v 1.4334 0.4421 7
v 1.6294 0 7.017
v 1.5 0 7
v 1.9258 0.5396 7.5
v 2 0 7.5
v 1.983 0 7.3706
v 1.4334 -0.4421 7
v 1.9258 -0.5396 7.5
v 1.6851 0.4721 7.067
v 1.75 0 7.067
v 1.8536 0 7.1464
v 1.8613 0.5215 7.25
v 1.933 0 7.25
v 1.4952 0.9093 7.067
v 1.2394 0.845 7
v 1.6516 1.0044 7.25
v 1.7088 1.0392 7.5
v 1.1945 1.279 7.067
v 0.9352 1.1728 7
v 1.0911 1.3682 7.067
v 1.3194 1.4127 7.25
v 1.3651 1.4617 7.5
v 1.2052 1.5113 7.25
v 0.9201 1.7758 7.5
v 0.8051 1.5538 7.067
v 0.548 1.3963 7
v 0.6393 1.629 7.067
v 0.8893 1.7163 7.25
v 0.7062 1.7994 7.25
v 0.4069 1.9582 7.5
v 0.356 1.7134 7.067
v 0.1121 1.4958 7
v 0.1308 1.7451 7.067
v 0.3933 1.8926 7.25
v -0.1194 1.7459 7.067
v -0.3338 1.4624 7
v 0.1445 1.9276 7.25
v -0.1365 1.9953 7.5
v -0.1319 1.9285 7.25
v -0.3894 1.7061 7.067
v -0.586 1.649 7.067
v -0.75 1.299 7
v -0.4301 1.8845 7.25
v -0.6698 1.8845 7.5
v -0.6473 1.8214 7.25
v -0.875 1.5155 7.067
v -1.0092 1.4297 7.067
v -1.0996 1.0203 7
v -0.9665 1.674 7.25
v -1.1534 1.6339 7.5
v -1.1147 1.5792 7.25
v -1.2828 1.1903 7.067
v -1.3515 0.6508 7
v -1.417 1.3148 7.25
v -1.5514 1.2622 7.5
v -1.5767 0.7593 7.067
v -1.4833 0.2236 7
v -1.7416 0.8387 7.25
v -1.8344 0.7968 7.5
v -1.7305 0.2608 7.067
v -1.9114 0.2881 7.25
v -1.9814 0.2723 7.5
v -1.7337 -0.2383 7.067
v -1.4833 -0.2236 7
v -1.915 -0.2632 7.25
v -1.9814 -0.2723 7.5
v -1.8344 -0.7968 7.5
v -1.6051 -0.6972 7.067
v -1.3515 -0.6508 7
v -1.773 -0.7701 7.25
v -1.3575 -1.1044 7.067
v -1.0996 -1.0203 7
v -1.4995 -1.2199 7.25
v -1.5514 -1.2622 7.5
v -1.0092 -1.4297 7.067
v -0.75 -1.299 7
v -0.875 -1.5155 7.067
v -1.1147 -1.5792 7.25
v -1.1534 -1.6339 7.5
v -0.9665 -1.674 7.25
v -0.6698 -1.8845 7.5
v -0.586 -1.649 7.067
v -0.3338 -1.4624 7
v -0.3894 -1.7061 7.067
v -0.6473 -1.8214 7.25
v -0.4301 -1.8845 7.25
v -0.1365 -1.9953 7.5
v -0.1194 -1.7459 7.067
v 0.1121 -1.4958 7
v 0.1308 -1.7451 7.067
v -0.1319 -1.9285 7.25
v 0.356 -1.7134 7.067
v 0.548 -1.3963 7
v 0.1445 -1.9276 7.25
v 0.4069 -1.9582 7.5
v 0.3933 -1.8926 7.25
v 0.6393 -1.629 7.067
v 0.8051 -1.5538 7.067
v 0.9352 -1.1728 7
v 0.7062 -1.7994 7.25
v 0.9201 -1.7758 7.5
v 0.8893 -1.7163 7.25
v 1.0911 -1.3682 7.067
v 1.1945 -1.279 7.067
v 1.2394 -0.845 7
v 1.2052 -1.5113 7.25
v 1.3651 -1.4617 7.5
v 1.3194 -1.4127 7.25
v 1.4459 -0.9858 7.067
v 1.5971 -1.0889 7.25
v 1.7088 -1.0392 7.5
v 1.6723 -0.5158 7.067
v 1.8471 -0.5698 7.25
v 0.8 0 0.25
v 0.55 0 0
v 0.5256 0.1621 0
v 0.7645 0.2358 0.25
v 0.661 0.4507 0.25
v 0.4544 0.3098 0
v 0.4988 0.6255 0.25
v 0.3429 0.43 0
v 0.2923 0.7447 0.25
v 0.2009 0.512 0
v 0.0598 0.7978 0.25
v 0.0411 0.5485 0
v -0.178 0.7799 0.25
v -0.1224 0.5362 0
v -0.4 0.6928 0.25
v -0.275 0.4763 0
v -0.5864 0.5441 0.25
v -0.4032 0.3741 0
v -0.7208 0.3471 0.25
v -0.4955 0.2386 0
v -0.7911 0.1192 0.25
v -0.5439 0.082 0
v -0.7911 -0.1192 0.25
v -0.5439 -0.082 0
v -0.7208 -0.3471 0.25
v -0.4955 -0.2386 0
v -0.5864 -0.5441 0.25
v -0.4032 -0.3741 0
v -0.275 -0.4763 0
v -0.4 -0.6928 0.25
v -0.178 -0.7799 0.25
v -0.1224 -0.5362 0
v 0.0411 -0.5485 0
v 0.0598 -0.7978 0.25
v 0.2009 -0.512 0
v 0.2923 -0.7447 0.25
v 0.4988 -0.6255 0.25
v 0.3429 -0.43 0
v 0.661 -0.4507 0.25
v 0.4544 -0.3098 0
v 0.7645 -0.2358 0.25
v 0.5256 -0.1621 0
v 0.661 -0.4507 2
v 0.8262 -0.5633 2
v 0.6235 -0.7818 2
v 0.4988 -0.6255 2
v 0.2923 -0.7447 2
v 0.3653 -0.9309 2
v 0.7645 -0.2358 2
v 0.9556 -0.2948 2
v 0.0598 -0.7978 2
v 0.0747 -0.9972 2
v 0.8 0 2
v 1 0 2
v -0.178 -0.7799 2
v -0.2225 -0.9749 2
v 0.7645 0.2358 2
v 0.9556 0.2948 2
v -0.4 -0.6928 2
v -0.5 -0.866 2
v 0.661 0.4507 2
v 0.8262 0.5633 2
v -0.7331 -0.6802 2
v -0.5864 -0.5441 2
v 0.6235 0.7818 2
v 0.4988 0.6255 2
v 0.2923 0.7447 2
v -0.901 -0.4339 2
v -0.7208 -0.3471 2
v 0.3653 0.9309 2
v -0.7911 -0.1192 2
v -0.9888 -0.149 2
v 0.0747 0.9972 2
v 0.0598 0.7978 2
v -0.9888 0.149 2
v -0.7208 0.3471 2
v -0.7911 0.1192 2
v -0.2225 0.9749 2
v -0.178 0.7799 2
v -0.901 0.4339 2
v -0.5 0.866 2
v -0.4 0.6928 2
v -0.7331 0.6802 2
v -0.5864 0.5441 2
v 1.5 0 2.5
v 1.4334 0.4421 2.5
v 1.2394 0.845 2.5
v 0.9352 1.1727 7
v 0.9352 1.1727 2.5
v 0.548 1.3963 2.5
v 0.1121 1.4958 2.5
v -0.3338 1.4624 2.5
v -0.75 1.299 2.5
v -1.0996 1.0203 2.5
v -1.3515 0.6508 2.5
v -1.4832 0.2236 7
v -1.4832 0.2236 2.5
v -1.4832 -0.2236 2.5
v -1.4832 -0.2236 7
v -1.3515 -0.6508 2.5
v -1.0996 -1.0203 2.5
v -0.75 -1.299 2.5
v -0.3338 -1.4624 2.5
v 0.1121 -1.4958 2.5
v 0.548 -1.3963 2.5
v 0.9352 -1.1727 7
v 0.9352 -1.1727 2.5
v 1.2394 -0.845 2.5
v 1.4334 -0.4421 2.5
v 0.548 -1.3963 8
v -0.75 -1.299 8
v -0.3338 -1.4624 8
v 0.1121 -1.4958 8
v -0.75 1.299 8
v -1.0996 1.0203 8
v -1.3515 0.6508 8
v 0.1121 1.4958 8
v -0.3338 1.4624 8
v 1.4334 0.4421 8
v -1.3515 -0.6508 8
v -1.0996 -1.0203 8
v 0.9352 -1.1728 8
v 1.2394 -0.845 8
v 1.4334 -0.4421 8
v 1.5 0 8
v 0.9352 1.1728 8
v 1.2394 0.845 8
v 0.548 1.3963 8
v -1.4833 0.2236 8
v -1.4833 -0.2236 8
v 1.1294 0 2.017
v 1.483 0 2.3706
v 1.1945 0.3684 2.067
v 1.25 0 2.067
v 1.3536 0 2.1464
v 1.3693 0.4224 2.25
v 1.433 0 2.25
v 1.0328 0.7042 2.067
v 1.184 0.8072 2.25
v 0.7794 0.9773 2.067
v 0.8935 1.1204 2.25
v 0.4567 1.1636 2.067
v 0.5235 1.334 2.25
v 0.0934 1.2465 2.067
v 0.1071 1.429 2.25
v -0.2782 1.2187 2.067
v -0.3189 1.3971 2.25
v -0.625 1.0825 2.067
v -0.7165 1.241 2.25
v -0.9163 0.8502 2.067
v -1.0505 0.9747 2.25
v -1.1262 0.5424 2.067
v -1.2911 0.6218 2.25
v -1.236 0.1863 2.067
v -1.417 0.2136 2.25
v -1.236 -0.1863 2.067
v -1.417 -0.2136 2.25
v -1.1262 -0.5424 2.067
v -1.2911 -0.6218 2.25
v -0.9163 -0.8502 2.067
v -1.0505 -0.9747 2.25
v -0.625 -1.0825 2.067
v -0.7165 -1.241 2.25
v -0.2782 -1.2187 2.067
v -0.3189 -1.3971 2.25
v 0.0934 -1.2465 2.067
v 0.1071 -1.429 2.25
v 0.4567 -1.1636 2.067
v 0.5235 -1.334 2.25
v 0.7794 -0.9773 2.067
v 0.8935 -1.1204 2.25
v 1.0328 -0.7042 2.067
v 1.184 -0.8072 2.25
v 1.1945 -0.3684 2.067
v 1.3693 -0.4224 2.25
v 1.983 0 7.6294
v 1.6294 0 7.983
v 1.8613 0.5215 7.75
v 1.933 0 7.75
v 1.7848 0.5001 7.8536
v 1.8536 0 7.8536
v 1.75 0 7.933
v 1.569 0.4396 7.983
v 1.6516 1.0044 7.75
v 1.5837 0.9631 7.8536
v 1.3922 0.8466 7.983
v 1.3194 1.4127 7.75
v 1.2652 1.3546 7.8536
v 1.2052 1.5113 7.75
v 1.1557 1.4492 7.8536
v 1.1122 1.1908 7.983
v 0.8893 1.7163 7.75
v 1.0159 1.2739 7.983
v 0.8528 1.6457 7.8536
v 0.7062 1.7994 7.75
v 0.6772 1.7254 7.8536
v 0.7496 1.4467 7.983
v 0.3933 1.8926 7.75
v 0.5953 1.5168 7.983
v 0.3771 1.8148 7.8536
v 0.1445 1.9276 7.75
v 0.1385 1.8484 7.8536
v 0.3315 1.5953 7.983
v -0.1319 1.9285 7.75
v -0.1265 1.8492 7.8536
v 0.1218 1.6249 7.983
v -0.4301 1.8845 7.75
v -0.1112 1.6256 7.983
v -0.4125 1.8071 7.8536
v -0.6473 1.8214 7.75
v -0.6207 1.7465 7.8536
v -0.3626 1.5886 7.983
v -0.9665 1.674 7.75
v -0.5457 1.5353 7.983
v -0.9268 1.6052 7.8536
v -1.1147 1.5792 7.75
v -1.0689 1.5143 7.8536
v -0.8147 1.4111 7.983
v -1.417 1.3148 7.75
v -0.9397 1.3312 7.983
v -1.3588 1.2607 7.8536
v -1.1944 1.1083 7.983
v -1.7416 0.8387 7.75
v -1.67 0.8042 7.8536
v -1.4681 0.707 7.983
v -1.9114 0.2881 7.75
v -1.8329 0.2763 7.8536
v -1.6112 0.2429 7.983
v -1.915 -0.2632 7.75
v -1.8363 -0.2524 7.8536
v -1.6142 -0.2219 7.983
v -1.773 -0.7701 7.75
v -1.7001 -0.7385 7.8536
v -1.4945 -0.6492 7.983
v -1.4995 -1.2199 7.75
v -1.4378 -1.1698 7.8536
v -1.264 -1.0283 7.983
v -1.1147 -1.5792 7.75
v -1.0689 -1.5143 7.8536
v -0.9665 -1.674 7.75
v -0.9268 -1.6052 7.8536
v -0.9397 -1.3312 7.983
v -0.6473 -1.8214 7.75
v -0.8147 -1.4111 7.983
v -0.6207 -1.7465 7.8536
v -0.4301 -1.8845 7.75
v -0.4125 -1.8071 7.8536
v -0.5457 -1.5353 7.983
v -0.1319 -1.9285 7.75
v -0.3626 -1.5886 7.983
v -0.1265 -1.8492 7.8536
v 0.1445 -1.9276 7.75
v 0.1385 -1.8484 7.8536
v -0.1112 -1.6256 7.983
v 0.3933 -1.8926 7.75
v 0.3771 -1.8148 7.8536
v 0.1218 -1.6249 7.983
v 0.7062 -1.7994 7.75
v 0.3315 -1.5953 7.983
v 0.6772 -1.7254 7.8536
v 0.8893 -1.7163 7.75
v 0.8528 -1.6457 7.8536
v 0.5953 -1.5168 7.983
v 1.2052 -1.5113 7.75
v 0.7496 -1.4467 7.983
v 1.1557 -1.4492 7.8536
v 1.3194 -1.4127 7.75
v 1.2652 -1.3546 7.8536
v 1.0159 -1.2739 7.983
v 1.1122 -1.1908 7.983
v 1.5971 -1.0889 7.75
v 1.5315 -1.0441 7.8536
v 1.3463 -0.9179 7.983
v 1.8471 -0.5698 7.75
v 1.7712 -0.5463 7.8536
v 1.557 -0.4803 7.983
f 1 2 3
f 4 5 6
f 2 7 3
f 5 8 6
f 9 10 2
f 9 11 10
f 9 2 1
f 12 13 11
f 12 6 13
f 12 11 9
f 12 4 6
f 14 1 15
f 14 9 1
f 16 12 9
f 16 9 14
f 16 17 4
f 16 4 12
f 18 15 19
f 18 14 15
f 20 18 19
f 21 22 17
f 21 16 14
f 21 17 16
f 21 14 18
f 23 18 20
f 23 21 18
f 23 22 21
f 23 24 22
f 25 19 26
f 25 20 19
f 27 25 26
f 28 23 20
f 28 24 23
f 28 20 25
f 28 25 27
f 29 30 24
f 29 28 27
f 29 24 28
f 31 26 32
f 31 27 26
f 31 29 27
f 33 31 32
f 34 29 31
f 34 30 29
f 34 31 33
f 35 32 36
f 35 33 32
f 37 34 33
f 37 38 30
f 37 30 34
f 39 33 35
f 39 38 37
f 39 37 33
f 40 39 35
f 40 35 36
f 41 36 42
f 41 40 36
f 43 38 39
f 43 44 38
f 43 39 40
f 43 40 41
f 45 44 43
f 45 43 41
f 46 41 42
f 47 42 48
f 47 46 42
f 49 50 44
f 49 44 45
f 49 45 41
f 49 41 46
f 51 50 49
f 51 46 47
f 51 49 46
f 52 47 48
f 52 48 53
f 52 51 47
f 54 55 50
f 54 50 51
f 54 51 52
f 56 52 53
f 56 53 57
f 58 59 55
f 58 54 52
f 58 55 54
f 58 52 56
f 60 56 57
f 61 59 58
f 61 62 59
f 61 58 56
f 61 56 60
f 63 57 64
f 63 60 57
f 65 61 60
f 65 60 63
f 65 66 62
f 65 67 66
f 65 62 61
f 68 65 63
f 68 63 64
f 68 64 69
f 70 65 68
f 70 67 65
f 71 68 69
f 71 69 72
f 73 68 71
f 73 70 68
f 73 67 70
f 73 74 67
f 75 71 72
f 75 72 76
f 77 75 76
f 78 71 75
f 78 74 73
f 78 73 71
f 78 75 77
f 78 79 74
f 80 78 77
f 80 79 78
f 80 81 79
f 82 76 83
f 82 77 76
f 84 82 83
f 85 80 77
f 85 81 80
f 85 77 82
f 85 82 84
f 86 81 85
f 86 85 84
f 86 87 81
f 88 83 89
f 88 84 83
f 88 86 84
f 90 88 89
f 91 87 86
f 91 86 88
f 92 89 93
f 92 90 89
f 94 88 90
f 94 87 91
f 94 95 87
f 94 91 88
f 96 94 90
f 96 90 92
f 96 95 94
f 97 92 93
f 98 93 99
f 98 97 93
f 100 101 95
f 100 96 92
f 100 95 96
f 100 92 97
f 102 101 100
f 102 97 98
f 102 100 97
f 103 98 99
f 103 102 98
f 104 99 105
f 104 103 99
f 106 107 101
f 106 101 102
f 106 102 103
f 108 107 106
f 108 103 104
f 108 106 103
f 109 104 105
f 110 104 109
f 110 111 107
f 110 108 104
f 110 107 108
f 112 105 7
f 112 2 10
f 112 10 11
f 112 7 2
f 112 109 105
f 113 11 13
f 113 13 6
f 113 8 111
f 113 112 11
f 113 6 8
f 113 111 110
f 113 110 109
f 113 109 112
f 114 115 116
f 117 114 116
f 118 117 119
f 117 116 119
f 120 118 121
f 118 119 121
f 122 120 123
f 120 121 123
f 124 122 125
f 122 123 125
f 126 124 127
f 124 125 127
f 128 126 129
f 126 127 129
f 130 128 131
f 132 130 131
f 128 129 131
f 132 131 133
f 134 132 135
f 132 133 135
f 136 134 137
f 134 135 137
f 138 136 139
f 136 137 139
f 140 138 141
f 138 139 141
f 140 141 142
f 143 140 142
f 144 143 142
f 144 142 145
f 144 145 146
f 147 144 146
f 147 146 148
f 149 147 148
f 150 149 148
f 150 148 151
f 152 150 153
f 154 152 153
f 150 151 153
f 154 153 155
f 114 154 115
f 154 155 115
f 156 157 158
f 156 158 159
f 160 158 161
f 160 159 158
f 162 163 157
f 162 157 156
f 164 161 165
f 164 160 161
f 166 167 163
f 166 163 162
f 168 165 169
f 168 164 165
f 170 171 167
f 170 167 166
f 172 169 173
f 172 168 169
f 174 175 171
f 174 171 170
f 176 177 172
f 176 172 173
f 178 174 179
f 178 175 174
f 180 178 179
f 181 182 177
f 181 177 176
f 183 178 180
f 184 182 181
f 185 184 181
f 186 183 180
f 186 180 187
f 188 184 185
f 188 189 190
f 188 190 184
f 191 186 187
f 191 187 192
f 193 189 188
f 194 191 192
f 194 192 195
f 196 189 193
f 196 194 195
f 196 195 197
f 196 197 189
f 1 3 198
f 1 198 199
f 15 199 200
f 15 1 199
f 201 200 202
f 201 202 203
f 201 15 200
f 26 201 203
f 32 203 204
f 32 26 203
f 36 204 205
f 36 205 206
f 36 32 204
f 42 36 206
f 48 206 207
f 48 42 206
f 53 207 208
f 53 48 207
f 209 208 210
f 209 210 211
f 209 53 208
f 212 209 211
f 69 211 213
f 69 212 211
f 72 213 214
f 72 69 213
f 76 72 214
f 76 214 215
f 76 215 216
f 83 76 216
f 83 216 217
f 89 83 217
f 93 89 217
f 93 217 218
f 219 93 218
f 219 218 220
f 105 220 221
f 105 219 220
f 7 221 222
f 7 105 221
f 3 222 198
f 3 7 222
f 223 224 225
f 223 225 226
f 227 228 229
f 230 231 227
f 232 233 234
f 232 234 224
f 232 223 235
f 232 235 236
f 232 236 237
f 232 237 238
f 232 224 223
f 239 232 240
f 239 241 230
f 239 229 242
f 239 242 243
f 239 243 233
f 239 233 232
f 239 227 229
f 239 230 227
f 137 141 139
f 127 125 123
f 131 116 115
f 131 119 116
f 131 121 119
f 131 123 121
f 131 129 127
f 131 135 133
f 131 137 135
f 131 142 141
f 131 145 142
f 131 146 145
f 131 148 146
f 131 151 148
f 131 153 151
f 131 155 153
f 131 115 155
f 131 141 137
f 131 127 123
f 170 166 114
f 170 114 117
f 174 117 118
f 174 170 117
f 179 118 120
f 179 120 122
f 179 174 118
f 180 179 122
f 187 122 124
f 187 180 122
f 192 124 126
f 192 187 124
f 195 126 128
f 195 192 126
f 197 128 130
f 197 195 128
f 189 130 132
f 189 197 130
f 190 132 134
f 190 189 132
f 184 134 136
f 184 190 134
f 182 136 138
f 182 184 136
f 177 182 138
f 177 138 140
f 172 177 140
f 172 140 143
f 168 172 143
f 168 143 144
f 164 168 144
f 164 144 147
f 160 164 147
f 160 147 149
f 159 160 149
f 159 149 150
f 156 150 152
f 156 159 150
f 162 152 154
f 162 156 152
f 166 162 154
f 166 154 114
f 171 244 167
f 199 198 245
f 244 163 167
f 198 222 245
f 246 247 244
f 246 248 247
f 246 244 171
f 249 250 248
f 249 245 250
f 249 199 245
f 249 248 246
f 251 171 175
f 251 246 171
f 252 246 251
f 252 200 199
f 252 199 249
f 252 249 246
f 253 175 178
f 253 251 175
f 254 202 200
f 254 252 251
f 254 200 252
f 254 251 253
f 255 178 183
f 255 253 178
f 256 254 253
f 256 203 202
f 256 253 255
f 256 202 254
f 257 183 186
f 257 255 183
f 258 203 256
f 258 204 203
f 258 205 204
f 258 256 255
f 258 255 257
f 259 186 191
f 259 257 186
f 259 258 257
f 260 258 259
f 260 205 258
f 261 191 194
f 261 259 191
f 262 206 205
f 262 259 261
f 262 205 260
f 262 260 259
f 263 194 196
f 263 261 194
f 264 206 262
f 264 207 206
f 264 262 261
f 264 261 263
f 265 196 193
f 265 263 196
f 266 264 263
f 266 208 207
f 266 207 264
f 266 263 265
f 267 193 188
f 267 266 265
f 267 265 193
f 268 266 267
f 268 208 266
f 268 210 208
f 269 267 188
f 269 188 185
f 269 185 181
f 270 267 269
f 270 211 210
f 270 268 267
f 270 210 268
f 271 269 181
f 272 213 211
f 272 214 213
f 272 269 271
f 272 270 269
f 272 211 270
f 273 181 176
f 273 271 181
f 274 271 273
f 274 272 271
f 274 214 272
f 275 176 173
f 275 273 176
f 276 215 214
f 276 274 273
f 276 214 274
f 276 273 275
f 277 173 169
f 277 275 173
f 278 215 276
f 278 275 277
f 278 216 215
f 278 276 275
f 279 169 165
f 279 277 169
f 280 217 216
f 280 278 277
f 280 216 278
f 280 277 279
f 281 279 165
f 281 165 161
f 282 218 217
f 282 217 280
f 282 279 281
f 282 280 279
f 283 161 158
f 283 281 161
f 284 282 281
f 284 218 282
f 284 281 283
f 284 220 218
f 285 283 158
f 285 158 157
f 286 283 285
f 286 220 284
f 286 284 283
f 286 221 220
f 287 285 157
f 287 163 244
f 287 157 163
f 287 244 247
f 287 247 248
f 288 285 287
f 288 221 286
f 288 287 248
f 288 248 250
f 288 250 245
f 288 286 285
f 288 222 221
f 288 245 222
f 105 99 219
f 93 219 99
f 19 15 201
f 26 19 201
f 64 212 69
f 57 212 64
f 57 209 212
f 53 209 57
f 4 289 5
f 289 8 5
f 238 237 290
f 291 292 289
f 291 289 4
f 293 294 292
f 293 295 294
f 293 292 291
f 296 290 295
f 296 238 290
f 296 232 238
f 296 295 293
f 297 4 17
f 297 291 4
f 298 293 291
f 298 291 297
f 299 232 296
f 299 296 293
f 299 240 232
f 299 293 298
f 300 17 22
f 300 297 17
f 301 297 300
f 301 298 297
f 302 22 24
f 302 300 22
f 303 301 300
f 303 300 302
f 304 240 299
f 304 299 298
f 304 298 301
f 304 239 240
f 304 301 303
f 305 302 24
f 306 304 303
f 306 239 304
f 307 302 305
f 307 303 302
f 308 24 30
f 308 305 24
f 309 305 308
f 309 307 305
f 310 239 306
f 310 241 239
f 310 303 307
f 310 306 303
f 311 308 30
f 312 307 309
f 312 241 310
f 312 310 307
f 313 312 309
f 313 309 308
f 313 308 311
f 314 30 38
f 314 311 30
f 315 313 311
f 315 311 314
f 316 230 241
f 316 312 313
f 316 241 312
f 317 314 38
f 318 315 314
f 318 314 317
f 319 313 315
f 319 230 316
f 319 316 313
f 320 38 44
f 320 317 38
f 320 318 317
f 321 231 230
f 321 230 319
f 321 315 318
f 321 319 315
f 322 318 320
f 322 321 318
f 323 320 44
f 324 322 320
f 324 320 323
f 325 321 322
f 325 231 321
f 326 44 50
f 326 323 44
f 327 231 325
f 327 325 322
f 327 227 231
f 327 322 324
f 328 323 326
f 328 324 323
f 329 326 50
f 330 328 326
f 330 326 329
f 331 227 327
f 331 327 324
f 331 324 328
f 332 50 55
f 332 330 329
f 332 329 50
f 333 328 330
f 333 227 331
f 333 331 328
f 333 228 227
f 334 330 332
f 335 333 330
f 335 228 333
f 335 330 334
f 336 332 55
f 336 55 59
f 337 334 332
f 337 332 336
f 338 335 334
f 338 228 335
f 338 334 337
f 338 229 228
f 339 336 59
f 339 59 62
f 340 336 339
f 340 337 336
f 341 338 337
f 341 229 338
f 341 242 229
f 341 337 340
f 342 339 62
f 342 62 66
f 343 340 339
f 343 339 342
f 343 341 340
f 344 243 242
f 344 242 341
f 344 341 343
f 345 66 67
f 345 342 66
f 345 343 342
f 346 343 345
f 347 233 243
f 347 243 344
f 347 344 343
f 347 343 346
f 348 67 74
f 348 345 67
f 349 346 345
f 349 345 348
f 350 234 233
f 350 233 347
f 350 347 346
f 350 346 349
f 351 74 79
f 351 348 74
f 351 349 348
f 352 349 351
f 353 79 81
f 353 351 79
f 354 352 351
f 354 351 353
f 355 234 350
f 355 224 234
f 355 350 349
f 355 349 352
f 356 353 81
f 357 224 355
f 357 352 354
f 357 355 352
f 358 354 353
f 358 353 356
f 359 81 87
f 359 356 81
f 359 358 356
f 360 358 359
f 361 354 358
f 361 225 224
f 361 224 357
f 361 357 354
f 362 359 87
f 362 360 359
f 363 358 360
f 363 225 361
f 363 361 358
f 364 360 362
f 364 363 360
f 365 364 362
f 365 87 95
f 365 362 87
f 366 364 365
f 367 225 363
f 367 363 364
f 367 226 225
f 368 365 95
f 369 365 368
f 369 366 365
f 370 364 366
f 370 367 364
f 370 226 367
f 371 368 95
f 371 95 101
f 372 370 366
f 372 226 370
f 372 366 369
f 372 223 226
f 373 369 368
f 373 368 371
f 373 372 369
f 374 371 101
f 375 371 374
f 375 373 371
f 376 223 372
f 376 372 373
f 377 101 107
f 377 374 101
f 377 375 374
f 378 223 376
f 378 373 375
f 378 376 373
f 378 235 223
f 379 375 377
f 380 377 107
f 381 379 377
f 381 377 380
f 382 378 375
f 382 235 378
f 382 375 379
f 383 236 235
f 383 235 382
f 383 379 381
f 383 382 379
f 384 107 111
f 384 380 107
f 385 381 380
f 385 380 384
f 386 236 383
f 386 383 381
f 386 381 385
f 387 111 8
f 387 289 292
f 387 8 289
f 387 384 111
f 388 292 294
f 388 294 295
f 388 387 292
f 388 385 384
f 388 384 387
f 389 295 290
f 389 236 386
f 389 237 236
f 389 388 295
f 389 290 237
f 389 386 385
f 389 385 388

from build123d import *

# Parameters (mm, degrees)
F2_R     = 0.49999
F3_SIZE2 = 0.25
F3_SIZE  = 0.25


# Not quite as in the source:
# - a fillet or chamfer is up to 0.001 mm smaller than in the source, because OpenCascade refuses the exact size


with BuildPart() as f1:
    # F0 (on Front) → F1 (revolve)
    with BuildSketch(Plane.XZ):
        Polygon((0, 8), (0, 0), (0.8, 0), (0.8, 2), (1.5, 2), (1.5, 7), (2, 7), (2, 8), align=None)
    revolve(axis=Axis((0, 0, 4), (0, 0, 1)))

    # F2 (radius 0.5 in the source; OpenCascade refuses exactly that, so slightly less here)
    f2_edges = [f1.edges().sort_by_distance(p)[0] for p in [
        (-2, 0, 7),
        (-2, 0, 8),
        (2, 0, 7.5),
        (-1.5, 0, 2),
    ]]
    fillet(f2_edges, radius=F2_R)

    # F3
    f3_edges = [f1.edges().sort_by_distance(p)[0] for p in [
        (-0.8, 0, 0),
    ]]
    chamfer(f3_edges, length=F3_SIZE, length2=F3_SIZE2)


solid = f1.part
